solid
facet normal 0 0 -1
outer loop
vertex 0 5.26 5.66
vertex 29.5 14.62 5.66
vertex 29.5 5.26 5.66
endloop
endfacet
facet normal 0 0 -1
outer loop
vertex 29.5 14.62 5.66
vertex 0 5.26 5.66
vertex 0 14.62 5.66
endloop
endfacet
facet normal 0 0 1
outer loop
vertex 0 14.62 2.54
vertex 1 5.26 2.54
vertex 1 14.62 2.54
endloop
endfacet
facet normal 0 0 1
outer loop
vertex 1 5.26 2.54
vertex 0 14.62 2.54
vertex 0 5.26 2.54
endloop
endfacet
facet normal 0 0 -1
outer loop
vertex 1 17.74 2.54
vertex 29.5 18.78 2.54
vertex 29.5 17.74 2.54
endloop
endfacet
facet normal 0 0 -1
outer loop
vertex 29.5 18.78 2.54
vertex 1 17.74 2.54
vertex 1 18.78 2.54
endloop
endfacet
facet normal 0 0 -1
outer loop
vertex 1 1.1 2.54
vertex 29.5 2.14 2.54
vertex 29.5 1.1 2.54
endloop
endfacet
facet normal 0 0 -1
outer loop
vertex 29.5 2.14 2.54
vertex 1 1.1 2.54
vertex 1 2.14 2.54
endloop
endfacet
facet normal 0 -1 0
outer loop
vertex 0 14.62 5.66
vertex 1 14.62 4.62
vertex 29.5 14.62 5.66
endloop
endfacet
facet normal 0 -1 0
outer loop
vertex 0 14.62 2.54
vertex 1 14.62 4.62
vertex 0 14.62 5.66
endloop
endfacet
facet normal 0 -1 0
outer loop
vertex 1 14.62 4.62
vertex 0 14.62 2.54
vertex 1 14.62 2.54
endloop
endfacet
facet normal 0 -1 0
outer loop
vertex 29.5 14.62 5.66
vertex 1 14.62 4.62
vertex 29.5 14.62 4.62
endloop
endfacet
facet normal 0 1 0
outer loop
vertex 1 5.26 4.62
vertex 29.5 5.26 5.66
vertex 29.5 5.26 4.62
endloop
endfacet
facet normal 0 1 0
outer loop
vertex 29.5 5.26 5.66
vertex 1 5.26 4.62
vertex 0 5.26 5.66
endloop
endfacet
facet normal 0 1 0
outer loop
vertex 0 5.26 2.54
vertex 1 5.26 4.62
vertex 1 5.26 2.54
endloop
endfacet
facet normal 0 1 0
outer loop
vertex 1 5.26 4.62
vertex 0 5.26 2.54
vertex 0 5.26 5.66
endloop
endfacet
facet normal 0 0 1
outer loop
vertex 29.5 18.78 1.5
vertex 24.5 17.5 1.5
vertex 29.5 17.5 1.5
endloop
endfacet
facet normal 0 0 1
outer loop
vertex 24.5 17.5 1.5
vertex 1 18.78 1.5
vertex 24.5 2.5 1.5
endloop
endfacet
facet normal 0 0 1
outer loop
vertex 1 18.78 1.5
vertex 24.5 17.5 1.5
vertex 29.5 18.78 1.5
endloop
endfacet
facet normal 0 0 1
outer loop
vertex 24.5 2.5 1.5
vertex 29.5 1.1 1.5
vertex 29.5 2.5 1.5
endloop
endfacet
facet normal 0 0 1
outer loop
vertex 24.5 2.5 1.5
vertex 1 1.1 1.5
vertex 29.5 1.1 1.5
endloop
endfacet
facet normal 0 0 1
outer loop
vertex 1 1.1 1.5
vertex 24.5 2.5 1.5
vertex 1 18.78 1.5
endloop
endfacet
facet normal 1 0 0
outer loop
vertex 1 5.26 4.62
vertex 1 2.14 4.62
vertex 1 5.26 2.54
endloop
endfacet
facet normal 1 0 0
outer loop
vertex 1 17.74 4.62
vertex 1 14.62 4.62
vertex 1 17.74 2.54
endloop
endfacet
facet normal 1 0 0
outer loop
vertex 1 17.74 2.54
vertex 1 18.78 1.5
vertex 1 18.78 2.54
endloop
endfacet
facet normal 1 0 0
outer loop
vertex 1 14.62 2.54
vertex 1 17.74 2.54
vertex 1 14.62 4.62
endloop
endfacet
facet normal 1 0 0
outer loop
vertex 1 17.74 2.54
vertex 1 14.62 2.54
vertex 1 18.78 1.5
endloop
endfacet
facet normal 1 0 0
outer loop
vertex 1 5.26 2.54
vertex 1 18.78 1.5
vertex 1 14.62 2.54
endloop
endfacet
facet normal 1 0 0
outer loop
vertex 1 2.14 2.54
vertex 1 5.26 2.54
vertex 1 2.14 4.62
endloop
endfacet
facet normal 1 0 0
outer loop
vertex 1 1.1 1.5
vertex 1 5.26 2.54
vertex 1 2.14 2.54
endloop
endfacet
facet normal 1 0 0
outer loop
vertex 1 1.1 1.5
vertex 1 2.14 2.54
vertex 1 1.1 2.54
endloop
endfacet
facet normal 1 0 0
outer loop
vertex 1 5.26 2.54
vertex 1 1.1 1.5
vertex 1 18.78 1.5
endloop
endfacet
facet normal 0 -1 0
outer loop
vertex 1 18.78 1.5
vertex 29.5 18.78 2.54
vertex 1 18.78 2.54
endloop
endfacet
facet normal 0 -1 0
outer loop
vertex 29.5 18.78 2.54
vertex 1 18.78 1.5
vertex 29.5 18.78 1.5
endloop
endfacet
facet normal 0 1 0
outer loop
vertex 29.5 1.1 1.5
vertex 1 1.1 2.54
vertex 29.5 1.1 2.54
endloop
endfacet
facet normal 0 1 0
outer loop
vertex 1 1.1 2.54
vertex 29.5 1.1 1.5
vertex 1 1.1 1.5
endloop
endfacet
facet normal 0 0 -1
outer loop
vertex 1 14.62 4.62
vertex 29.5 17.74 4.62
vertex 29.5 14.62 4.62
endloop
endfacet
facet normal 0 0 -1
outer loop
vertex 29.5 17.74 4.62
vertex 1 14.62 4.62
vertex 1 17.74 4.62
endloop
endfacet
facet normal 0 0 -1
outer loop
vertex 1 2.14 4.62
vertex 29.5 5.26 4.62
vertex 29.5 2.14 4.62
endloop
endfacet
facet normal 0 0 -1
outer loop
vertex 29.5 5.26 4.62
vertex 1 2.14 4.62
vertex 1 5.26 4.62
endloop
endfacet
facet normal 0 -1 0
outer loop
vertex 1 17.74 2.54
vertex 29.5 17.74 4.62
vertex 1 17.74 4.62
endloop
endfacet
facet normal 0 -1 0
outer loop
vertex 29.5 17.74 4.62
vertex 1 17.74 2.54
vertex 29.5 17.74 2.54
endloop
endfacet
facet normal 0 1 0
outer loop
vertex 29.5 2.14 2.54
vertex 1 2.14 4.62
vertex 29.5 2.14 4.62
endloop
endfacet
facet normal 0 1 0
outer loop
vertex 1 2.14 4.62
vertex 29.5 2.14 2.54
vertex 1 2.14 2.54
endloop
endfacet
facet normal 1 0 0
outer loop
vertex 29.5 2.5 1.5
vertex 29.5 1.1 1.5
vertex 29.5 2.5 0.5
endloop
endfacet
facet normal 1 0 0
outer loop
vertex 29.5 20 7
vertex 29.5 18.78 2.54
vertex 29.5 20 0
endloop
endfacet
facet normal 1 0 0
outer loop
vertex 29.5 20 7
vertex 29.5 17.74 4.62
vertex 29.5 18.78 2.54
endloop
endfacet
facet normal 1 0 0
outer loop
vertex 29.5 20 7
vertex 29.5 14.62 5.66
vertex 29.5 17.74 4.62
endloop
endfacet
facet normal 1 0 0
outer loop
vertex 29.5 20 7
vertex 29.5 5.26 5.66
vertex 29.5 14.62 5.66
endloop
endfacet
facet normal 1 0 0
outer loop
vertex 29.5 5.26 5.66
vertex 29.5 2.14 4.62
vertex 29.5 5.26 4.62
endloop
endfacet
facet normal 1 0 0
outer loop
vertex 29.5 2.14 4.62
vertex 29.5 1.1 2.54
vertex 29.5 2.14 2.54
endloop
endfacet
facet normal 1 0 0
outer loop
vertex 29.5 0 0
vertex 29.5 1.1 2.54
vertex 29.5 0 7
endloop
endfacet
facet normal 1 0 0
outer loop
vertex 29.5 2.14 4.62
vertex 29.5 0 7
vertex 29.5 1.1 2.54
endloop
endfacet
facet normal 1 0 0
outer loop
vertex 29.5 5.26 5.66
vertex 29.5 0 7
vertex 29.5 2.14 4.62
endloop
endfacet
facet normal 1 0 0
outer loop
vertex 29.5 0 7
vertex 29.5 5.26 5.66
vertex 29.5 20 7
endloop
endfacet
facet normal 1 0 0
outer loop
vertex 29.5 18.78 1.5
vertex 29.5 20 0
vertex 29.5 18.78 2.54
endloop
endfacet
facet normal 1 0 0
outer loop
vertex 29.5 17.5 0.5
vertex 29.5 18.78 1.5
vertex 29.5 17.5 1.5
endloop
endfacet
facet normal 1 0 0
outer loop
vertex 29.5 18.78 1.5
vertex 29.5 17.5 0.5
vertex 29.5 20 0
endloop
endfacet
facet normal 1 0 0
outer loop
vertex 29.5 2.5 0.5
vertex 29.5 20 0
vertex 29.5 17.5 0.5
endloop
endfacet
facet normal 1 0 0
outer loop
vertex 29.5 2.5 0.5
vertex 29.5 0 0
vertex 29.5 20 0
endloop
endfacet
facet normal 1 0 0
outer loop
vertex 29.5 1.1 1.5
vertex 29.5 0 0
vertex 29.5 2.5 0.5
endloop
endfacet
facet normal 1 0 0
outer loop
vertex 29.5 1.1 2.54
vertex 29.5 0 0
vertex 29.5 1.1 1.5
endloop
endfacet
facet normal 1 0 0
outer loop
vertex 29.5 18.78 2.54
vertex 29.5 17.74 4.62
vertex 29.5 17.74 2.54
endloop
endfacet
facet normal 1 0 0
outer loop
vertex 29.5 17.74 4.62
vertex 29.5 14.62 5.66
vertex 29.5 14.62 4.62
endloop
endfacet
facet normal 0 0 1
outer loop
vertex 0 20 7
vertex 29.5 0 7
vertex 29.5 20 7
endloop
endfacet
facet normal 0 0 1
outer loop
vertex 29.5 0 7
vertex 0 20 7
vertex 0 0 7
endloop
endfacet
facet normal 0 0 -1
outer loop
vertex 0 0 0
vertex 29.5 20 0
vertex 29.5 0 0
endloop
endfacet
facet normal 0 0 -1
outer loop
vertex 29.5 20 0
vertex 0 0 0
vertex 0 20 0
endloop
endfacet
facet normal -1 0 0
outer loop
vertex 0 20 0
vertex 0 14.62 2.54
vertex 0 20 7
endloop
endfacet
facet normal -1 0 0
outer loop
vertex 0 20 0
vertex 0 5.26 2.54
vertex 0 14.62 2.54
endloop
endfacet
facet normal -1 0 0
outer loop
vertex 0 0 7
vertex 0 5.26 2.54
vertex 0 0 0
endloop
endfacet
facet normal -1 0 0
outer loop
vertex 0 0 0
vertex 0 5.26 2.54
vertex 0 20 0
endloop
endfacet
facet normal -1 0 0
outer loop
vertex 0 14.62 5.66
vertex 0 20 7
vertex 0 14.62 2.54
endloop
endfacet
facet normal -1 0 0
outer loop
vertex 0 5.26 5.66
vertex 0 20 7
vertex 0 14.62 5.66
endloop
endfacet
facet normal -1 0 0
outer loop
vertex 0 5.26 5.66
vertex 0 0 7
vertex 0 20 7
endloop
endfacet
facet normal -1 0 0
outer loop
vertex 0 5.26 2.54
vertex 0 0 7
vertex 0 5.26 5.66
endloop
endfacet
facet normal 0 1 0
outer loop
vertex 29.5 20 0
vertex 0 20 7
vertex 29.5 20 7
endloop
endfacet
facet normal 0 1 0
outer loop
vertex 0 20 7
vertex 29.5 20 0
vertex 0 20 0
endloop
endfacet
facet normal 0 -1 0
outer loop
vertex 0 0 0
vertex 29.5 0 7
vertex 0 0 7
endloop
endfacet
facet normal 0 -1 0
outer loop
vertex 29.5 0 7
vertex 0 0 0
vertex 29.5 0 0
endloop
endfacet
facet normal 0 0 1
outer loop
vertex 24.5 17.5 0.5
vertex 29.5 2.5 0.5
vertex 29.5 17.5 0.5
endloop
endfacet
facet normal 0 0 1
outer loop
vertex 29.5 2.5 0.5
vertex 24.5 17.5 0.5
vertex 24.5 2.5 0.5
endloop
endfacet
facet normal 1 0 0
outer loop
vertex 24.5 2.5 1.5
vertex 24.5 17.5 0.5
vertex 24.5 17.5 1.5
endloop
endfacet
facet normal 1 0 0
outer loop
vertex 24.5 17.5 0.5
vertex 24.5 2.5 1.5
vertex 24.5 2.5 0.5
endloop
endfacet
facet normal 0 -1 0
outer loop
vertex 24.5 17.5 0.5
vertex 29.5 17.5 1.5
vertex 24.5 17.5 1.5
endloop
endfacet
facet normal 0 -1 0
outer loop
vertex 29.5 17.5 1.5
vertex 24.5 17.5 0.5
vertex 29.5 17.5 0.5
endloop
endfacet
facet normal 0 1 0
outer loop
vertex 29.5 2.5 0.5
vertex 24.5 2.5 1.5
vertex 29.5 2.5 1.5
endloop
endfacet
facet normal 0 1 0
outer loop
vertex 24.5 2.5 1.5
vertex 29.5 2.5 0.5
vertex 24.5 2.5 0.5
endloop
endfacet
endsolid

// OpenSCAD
/*


   ________________________________________
  |   ____________________________________|
__|  |
|_   |
  |  |____________________________________
  |______________________________________|

*/

uc_x=28;
uc_y=17;
uc_z=1;

uc_z_offset = 1;
uc_z_plus = 3;

usbc_x_over=1;
usbc_z=3;
usbc_y=9;

uc_y_plus = uc_y-2*uc_z_offset;

uc_z_max=uc_z + usbc_z;

uc_pins_x=5;
uc_pins_z=1;


thickness = 1.5;

x_max = uc_x+thickness;

y_max = uc_y + 2*thickness;
z_max = uc_z_max + 2*thickness;

scale_off=1.04;
scale_off_translate_cor=-0.4;

difference(){
  cube([x_max,y_max,z_max]);

  translate([usbc_x_over,thickness+scale_off_translate_cor,thickness])
  scale([scale_off,scale_off,scale_off]) 
  usb_c();

  //uc pins
  translate([x_max-uc_pins_x,(uc_y-uc_y_plus)/2+thickness,thickness-uc_pins_z])
  cube([uc_pins_x,uc_y_plus,uc_pins_z]);
}

module usb_c(){
  //usb_c
  translate([-usbc_x_over,(uc_y-usbc_y)/2,uc_z])
  cube([uc_x+usbc_x_over,usbc_y,usbc_z]);

  //uc bottom
  // translate([thickness,thickness,thickness])
  cube([uc_x,uc_y,uc_z]);


  //uc bottom plus
  translate([0,(uc_y-uc_y_plus)/2,0])
  cube([uc_x,uc_y_plus,uc_z_plus]);
}
